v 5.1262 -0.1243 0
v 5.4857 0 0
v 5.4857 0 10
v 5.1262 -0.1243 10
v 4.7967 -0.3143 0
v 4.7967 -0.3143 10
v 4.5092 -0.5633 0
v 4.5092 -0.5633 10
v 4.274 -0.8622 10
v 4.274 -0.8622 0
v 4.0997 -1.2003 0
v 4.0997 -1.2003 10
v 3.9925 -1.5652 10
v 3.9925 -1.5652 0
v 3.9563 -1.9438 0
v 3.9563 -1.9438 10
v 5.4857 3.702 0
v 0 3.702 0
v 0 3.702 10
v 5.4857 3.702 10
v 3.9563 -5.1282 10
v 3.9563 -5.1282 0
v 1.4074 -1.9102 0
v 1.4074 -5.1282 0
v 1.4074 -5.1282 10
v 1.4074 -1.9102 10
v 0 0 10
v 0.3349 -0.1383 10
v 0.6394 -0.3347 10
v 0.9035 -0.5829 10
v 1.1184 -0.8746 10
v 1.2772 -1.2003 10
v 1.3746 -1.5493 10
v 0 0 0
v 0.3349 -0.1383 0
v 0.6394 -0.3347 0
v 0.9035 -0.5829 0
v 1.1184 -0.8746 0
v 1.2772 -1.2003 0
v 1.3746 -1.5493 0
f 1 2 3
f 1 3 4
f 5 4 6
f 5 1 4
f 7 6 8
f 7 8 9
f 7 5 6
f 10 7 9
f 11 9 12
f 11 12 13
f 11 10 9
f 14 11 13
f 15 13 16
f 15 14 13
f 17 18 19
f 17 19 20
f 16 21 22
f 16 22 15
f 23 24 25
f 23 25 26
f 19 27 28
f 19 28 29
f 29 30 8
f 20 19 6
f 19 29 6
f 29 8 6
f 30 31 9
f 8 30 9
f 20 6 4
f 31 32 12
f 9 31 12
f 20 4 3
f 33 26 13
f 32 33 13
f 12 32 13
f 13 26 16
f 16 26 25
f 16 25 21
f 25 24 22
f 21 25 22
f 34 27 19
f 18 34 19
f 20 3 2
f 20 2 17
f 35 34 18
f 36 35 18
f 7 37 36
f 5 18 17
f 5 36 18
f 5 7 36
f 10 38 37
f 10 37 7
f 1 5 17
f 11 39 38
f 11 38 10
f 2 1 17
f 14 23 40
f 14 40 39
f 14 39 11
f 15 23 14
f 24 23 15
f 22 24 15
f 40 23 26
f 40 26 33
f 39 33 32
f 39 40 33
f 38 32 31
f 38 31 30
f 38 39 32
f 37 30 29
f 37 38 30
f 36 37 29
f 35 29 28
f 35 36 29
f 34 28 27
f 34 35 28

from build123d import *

# Parameters (mm, degrees)
SKETCH3_W           = 5.48566609
SKETCH3_H           = 3.701966347
SKETCH3_W_2         = 2.548907401
SKETCH3_H_2         = 5.128177147
BOSS_EXTRUDE2_DEPTH = 10
FILLET1_R           = 2


with BuildPart() as part:
    # Sketch3 → Boss-Extrude2 (new body)
    with BuildSketch(Plane.XY):
        with Locations((2.742833045, 1.850983174)):
            Rectangle(SKETCH3_W, SKETCH3_H)
        with Locations((2.68186795, -2.564088574)):
            Rectangle(SKETCH3_W_2, SKETCH3_H_2)
    extrude(amount=BOSS_EXTRUDE2_DEPTH)

    # Fillet1
    # the kernel refuses this fillet: 2 mm, written as the material it adds along each edge
    with BuildSketch(Plane(origin=(3.95632165, 0, 0), x_dir=(1, 0, 0), z_dir=(0, 0, 1))) as fillet1_piece_1:
        with BuildLine():
            CenterArc((2, -1.943832129), FILLET1_R, 103.610945059, 76.389054941)
            Line((0, -1.943832129), (-0.04, -1.943832129))
            Line((-0.04, -1.943832129), (-0.04, 0))
            Line((-0.04, 0), (0, 0.04))
            ThreePointArc((0, 0.04), (0.76467222, 0.04), (1.519931329, 0.038876643))
            Line((1.519931329, 0.038876643), (1.52934444, 0))
        make_face()
    extrude(amount=10)
    with BuildSketch(Plane(origin=(1.407414249, 0, 0), x_dir=(-1, 0, 0), z_dir=(0, 0, 1))) as fillet1_piece_2:
        with BuildLine():
            CenterArc((2, 1.910194265), FILLET1_R, 180, 72.764919968)
            Line((0, 1.910194265), (-0.04, 1.910194265))
            Line((-0.04, 1.910194265), (-0.04, 0))
            Line((-0.04, 0), (0, -0.04))
            ThreePointArc((0, -0.04), (0.703707125, -0.04), (1.395562534, -0.038203885))
            Line((1.395562534, -0.038203885), (1.407414249, 0))
        make_face()
    extrude(amount=10)


solid = part.part
